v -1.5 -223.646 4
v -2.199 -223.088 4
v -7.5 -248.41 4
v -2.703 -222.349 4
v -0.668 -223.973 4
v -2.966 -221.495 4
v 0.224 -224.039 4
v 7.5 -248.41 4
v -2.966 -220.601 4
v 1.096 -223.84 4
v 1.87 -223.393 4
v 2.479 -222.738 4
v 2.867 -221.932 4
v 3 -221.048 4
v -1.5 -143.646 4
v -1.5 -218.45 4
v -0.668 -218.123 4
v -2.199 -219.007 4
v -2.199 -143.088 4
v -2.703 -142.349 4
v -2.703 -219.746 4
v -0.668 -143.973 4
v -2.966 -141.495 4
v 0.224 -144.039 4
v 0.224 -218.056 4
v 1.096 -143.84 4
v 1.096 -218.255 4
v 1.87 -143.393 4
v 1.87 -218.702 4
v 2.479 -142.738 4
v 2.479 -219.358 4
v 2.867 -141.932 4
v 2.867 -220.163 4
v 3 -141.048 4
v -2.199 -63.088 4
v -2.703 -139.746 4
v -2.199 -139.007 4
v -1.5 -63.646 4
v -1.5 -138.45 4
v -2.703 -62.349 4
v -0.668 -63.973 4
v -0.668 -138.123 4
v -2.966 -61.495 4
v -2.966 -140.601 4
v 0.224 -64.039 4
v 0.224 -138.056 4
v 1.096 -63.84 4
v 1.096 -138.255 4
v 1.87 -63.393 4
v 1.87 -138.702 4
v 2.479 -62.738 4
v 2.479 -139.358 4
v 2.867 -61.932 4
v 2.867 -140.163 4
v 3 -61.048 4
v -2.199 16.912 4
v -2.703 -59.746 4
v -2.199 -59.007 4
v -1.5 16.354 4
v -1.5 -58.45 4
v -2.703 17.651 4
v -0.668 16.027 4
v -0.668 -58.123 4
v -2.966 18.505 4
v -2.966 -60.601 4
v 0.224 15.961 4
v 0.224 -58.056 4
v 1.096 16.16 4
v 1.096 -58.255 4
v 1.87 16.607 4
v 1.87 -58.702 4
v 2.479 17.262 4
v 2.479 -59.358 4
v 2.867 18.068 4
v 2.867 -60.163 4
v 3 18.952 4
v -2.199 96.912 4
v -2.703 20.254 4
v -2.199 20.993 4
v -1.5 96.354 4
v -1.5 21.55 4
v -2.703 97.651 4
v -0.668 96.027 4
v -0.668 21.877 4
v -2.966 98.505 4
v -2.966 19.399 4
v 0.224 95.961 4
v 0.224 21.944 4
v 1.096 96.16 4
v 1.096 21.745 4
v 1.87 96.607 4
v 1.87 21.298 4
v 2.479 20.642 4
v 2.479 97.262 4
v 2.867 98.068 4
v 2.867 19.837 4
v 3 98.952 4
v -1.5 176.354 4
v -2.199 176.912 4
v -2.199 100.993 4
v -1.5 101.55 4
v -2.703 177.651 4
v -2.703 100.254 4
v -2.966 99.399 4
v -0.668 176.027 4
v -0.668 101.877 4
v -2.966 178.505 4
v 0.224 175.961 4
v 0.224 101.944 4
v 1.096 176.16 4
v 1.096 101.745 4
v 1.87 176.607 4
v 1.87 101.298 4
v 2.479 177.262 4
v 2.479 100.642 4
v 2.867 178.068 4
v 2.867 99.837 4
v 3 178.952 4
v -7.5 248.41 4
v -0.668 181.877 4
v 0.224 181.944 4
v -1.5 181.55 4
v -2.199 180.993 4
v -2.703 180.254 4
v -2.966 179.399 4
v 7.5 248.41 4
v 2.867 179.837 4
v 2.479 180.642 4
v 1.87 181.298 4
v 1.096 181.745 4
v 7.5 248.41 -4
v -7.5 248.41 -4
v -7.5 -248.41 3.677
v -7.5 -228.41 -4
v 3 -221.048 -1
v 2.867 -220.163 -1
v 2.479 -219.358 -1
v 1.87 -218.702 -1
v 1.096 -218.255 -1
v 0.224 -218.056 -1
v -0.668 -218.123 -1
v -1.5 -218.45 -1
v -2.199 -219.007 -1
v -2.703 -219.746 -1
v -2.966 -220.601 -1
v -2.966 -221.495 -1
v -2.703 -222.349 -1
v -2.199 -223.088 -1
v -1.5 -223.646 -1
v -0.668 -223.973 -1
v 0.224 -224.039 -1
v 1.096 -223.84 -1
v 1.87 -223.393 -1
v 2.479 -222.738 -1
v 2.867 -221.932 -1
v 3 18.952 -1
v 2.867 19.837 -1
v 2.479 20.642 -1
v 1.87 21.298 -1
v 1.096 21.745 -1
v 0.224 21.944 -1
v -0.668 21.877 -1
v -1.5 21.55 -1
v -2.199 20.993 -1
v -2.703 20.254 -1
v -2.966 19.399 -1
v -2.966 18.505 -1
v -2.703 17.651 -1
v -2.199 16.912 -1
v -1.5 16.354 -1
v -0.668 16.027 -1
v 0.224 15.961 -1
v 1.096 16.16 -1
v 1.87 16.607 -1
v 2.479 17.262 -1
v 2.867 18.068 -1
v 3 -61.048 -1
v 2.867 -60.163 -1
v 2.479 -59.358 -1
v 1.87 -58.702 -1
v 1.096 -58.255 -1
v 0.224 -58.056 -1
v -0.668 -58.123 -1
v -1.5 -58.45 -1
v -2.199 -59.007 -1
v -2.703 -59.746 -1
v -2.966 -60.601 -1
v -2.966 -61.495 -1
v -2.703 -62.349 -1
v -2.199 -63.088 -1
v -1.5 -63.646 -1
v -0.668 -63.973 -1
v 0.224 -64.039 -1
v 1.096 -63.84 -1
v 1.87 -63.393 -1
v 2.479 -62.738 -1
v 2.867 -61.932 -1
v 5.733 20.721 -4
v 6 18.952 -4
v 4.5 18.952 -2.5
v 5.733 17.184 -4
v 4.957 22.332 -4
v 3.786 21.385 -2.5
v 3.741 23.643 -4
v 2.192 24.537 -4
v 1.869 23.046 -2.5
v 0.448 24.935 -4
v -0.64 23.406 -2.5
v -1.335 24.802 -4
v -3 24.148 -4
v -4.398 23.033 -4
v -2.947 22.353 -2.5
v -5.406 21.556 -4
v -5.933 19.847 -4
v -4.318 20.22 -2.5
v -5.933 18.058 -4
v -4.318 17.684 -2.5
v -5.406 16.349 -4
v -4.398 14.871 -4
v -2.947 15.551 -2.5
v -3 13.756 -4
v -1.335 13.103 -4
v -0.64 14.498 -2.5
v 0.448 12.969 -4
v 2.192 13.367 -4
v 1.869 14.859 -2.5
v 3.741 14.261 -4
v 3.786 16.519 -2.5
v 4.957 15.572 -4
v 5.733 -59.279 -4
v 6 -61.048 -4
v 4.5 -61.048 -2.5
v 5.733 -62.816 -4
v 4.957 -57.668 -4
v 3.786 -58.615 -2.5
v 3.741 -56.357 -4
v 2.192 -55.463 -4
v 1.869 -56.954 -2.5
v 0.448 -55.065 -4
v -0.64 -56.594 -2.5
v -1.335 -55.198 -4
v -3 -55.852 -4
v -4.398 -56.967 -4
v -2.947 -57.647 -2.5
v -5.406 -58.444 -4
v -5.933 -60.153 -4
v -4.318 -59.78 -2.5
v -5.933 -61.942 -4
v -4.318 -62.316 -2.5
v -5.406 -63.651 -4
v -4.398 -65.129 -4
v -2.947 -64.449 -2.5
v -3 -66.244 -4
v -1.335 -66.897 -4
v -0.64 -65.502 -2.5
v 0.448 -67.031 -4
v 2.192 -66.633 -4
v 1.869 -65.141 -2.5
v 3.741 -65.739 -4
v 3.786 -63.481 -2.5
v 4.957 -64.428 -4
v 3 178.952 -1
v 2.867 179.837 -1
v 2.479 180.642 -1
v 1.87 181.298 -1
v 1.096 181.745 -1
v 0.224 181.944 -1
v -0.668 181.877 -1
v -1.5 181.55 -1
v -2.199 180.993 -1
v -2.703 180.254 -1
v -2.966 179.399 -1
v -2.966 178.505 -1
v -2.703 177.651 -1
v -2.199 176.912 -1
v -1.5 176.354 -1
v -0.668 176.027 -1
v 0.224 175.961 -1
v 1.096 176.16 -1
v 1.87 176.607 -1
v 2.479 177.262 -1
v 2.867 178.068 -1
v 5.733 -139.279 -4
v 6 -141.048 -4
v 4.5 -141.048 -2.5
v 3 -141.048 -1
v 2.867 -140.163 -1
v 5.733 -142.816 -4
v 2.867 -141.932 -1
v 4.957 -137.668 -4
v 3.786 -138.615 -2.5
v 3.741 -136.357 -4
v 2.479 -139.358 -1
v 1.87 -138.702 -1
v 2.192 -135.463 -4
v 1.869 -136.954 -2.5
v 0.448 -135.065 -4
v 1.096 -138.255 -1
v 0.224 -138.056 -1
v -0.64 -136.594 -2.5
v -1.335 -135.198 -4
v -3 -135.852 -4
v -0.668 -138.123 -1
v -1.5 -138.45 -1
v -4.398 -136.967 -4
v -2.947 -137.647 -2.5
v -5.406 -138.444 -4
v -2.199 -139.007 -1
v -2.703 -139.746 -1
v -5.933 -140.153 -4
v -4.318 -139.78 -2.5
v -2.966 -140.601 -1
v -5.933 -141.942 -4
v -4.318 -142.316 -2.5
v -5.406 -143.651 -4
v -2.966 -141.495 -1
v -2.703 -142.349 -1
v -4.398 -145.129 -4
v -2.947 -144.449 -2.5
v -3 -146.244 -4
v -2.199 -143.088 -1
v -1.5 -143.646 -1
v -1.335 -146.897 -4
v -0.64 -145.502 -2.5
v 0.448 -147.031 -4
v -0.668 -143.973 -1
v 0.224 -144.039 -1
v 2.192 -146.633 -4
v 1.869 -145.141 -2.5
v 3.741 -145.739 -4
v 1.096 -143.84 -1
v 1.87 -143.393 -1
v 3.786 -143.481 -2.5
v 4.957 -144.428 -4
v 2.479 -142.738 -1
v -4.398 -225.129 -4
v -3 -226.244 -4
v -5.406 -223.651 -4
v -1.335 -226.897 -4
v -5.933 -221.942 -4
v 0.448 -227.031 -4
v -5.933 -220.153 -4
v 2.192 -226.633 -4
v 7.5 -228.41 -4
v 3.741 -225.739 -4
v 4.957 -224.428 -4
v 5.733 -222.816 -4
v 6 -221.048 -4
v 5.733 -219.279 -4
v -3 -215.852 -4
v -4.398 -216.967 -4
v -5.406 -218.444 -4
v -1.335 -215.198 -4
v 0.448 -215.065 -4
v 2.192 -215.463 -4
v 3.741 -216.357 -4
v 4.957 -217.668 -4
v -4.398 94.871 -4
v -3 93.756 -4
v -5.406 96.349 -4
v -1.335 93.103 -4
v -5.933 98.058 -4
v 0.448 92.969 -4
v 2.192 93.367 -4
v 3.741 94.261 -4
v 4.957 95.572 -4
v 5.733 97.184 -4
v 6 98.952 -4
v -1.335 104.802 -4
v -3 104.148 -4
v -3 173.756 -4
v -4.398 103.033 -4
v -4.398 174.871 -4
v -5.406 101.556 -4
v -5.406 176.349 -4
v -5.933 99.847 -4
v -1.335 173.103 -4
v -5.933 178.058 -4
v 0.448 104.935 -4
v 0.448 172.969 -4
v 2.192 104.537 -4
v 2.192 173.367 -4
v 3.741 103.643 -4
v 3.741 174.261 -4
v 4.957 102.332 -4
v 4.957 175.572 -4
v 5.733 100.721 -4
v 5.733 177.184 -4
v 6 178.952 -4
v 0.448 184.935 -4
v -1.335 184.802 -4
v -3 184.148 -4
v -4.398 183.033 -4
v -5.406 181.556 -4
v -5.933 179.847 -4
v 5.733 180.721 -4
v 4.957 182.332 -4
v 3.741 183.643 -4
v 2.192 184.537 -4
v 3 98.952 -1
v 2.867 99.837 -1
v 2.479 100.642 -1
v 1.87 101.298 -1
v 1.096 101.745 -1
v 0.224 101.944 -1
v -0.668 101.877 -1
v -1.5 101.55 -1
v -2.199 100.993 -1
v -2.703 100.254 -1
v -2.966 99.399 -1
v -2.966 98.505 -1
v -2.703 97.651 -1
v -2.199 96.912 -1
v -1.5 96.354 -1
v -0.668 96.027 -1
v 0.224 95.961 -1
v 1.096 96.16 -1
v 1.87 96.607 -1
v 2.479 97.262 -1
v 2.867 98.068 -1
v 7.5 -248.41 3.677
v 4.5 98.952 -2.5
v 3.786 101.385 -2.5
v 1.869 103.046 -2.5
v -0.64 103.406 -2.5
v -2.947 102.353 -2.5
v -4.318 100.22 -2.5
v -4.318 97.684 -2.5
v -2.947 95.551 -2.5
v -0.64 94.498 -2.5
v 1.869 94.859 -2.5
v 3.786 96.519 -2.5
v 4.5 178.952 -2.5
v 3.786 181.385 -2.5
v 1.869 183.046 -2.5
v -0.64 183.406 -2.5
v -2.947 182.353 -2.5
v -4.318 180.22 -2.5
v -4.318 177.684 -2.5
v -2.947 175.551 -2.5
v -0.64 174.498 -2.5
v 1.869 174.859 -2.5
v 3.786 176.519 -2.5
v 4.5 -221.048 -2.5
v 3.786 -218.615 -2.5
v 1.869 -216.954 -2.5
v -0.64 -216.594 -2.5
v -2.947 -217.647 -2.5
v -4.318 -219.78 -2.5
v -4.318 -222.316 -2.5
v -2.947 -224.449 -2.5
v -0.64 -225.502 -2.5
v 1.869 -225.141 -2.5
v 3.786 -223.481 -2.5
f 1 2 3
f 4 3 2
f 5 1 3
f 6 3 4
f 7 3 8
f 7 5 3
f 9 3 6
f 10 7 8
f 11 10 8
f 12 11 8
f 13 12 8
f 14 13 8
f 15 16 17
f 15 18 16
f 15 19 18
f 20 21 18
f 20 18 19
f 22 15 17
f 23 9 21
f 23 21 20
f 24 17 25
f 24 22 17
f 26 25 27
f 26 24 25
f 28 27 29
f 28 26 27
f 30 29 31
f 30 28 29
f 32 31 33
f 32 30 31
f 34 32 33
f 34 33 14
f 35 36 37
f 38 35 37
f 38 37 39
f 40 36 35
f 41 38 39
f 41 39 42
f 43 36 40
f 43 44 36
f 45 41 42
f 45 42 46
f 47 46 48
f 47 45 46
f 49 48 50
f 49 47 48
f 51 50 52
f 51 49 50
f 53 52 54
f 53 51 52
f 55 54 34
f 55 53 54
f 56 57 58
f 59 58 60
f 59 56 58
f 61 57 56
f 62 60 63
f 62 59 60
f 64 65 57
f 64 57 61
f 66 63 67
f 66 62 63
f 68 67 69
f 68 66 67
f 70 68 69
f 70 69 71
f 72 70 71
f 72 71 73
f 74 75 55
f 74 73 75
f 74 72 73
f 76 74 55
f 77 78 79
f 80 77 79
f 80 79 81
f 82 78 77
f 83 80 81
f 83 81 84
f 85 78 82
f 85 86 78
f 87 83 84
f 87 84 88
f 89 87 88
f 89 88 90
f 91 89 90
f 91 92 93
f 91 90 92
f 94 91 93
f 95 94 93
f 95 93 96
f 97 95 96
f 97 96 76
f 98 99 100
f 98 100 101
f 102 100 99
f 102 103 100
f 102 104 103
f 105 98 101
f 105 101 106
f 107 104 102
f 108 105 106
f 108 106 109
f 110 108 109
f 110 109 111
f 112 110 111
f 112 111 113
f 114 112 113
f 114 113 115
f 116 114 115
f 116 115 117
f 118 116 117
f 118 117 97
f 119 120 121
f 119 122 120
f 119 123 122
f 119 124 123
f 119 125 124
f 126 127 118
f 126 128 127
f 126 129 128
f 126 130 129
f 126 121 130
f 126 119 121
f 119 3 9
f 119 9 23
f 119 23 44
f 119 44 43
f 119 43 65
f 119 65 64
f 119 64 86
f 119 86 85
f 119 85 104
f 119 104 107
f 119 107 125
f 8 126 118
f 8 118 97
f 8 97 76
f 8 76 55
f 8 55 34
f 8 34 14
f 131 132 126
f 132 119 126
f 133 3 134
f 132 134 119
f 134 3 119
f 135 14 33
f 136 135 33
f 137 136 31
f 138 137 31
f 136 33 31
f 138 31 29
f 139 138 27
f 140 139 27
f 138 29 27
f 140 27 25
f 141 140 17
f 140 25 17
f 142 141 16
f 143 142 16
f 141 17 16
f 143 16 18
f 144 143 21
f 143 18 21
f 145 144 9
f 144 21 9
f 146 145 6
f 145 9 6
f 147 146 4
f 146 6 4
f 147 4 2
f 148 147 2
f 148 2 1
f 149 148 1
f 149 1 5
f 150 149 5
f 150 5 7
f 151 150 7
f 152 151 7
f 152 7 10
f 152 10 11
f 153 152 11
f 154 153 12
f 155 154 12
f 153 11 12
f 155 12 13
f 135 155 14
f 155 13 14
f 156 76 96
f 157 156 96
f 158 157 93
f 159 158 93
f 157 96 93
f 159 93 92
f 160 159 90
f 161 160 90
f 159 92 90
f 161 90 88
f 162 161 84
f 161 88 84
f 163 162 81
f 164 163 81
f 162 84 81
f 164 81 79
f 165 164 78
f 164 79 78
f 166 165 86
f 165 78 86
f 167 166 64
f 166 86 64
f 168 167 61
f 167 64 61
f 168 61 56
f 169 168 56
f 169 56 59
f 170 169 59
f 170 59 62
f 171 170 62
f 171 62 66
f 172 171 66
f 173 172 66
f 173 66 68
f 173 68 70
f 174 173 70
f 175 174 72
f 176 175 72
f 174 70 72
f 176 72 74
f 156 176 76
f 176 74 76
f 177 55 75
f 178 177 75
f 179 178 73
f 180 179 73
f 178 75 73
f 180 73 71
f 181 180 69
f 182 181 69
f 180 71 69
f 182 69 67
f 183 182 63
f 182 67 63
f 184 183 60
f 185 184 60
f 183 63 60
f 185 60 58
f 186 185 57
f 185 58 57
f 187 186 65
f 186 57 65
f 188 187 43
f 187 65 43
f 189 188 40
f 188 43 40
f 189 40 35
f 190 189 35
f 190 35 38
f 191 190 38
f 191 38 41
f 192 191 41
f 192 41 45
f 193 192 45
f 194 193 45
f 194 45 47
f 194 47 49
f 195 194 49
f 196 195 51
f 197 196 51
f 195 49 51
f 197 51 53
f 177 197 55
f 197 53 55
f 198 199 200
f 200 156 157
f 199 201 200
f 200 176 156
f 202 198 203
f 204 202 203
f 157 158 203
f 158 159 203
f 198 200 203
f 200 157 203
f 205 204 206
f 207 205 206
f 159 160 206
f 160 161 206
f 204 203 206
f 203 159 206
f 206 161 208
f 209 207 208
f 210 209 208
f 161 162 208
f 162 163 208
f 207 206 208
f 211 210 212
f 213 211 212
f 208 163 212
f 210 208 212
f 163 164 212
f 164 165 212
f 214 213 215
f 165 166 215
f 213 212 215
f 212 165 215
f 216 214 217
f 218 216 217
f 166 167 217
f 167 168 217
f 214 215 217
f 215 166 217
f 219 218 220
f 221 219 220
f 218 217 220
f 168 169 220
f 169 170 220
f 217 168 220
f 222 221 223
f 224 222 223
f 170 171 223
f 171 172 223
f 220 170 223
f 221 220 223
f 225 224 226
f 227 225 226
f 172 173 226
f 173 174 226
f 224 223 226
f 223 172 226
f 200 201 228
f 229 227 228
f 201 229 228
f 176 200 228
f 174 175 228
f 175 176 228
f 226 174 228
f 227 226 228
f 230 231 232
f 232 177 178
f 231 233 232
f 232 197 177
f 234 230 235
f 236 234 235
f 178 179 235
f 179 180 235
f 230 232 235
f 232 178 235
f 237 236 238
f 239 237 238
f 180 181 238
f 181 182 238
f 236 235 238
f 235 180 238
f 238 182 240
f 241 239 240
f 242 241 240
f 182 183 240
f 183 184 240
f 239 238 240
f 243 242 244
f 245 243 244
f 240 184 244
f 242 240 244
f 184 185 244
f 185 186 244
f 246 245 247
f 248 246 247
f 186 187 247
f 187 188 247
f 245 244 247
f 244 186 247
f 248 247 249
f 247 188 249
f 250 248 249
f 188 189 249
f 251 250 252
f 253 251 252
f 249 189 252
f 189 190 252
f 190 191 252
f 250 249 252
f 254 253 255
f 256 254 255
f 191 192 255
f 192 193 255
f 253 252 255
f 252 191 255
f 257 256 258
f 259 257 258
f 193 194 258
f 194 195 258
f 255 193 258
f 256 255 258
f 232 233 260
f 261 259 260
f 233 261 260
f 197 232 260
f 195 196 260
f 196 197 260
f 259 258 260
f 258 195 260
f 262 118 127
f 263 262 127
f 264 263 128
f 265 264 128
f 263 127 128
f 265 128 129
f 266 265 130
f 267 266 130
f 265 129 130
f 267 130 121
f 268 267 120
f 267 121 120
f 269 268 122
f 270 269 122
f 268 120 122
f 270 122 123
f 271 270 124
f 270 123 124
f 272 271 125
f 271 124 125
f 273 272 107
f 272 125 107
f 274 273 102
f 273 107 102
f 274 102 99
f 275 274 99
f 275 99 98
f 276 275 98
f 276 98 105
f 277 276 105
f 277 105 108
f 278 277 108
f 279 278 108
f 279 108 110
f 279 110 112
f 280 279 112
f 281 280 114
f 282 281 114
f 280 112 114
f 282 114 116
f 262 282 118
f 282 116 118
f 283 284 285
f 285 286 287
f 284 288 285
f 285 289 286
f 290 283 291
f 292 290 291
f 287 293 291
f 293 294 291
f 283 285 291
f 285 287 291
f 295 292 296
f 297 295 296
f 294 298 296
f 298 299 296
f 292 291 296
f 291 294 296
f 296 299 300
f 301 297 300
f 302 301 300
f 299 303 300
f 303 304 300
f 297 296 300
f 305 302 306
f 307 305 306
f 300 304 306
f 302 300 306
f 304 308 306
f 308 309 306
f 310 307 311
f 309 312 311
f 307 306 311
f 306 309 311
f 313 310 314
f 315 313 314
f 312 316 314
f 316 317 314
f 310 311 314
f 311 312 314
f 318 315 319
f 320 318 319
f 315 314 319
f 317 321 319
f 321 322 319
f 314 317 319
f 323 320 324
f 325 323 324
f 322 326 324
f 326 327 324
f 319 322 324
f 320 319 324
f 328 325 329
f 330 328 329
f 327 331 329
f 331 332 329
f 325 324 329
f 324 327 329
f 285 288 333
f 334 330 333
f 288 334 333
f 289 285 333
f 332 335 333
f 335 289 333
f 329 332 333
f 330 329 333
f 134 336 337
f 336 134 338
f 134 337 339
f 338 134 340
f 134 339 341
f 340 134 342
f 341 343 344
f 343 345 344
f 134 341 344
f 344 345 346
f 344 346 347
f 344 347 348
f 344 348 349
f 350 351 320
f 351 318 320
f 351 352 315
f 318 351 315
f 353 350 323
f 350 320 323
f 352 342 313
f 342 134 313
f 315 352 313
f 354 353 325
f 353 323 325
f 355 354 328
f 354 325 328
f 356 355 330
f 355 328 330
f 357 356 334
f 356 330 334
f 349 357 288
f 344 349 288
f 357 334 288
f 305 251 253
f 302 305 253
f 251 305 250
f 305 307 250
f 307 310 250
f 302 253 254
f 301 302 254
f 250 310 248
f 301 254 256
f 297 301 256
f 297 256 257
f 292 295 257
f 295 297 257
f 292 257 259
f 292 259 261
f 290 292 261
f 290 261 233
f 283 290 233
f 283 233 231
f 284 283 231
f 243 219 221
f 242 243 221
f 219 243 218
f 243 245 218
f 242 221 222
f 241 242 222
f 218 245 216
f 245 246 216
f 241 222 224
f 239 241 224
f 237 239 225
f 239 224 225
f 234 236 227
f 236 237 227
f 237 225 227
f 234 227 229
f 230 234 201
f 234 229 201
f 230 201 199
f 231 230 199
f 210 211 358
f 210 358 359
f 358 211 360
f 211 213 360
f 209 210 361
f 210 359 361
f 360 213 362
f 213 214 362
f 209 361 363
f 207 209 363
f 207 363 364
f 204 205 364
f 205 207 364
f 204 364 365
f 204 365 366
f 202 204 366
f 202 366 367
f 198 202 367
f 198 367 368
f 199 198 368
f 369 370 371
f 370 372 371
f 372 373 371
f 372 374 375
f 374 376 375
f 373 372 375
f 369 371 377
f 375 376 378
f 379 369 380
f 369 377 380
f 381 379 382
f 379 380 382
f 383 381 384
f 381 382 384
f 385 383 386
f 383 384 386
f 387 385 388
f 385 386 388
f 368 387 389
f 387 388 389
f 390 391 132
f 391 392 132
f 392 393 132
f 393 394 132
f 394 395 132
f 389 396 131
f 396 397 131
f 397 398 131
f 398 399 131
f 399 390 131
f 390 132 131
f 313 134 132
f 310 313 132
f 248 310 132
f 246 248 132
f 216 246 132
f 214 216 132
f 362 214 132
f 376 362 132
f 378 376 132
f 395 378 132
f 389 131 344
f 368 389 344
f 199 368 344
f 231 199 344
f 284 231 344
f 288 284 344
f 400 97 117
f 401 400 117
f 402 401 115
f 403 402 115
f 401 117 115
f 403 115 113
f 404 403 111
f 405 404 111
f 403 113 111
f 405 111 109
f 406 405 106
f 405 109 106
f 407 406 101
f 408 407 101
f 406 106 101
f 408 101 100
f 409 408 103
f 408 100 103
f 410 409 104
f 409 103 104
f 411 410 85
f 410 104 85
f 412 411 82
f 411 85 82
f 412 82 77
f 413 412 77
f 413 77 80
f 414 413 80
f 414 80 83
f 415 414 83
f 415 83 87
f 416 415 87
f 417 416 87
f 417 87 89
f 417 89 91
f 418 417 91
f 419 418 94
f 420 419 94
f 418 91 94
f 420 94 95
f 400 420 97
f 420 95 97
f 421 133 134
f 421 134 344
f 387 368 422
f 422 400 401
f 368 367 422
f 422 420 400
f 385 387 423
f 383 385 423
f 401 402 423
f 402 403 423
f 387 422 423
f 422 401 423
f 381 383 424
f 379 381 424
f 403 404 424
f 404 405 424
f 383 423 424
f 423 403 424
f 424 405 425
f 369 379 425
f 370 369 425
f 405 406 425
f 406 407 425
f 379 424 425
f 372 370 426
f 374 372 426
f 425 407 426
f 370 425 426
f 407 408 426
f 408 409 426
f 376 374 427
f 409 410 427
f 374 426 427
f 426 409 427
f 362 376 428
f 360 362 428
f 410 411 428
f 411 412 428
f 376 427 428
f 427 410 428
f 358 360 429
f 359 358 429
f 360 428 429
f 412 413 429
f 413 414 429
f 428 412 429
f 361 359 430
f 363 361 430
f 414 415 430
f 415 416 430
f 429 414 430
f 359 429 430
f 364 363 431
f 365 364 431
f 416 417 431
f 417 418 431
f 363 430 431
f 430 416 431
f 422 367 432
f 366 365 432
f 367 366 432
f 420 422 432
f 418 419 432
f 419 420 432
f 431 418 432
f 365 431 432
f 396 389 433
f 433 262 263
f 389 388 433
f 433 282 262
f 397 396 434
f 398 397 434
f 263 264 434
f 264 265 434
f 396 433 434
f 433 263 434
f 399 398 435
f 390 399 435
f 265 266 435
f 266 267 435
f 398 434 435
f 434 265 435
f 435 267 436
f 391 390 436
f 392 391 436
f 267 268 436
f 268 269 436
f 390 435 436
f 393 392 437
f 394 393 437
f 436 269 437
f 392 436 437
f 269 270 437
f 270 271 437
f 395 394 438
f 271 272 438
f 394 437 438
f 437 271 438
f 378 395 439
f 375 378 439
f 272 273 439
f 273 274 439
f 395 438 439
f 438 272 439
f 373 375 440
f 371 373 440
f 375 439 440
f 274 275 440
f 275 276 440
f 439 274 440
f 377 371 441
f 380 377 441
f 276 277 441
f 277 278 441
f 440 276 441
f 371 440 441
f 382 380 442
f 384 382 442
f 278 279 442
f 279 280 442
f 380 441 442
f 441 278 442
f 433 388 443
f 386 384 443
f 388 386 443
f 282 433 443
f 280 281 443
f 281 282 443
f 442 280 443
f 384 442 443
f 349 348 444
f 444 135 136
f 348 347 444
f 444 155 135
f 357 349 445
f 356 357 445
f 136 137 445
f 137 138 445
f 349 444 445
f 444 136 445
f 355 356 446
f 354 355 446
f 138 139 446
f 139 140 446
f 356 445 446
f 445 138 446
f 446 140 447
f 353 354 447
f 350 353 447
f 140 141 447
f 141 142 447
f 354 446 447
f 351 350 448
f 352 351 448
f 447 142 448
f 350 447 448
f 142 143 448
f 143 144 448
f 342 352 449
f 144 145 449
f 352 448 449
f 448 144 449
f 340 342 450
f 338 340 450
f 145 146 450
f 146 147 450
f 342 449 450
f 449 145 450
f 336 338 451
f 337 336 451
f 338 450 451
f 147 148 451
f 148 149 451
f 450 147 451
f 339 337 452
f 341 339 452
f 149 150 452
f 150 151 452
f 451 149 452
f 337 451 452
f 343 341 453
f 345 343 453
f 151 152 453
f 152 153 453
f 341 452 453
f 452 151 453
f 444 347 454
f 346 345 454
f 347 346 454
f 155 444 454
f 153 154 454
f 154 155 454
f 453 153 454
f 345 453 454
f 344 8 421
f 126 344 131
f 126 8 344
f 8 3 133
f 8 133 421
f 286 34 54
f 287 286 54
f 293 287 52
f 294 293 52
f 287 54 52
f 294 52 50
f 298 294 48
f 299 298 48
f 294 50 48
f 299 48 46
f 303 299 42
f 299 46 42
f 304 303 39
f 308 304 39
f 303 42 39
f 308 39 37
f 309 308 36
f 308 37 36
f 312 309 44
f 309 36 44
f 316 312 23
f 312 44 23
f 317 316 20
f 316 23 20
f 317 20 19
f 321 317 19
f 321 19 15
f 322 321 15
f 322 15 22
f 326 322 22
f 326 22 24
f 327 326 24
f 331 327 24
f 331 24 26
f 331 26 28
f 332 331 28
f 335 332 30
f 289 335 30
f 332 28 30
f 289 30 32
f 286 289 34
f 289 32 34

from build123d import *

# Parameters (mm, degrees)
SKETCH1_W           = 15
SKETCH1_H           = 496.82
BOSS_EXTRUDE1_DEPTH = 4
SKETCH2_R           = 3
CUT_EXTRUDE1_DEPTH  = 8
CHAMFER1_SIZE       = 20
CHAMFER1_SIZE2      = 7.677280701
LPATTERN1_COUNT     = 6
LPATTERN1_PITCH     = 80
CHAMFER3_SIZE       = 3


with BuildPart() as part:
    # Sketch1 → Boss-Extrude1 (new, symmetric)
    with BuildSketch(Plane.XY):
        Rectangle(SKETCH1_W, SKETCH1_H)
    extrude(amount=BOSS_EXTRUDE1_DEPTH, both=True)

    # Sketch2 → Cut-Extrude1 (cut)
    with BuildSketch(Plane.XY.offset(4)):
        with Locations((0, 178.95225561)):
            Circle(SKETCH2_R)
    cut_extrude1 = extrude(amount=-CUT_EXTRUDE1_DEPTH, mode=Mode.SUBTRACT)

    # Chamfer1
    chamfer1_edges = [part.edges().sort_by_distance(p)[0] for p in [
        (0, -248.41, -4),
    ]]
    chamfer1_side = [part.faces().sort_by_distance(p)[0] for p in [
        (0, -0.68153803, -4),
    ]]
    chamfer(chamfer1_edges, length=CHAMFER1_SIZE, length2=CHAMFER1_SIZE2, reference=chamfer1_side[0])

    # LPattern1: Cut-Extrude1 ×6
    with Locations(*[(0, -i * LPATTERN1_PITCH, 0) for i in range(1, LPATTERN1_COUNT)]):
        add(cut_extrude1, mode=Mode.SUBTRACT)

    # Chamfer3
    chamfer3_edges = [part.edges().sort_by_distance(p)[0] for p in [
        (-3, 178.95225561, -4),
        (-3, 98.95225561, -4),
        (-3, 18.95225561, -4),
        (-3, -61.04774439, -4),
        (-3, -141.04774439, -4),
        (-3, -221.04774439, -4),
    ]]
    chamfer(chamfer3_edges, length=CHAMFER3_SIZE)


solid = part.part
